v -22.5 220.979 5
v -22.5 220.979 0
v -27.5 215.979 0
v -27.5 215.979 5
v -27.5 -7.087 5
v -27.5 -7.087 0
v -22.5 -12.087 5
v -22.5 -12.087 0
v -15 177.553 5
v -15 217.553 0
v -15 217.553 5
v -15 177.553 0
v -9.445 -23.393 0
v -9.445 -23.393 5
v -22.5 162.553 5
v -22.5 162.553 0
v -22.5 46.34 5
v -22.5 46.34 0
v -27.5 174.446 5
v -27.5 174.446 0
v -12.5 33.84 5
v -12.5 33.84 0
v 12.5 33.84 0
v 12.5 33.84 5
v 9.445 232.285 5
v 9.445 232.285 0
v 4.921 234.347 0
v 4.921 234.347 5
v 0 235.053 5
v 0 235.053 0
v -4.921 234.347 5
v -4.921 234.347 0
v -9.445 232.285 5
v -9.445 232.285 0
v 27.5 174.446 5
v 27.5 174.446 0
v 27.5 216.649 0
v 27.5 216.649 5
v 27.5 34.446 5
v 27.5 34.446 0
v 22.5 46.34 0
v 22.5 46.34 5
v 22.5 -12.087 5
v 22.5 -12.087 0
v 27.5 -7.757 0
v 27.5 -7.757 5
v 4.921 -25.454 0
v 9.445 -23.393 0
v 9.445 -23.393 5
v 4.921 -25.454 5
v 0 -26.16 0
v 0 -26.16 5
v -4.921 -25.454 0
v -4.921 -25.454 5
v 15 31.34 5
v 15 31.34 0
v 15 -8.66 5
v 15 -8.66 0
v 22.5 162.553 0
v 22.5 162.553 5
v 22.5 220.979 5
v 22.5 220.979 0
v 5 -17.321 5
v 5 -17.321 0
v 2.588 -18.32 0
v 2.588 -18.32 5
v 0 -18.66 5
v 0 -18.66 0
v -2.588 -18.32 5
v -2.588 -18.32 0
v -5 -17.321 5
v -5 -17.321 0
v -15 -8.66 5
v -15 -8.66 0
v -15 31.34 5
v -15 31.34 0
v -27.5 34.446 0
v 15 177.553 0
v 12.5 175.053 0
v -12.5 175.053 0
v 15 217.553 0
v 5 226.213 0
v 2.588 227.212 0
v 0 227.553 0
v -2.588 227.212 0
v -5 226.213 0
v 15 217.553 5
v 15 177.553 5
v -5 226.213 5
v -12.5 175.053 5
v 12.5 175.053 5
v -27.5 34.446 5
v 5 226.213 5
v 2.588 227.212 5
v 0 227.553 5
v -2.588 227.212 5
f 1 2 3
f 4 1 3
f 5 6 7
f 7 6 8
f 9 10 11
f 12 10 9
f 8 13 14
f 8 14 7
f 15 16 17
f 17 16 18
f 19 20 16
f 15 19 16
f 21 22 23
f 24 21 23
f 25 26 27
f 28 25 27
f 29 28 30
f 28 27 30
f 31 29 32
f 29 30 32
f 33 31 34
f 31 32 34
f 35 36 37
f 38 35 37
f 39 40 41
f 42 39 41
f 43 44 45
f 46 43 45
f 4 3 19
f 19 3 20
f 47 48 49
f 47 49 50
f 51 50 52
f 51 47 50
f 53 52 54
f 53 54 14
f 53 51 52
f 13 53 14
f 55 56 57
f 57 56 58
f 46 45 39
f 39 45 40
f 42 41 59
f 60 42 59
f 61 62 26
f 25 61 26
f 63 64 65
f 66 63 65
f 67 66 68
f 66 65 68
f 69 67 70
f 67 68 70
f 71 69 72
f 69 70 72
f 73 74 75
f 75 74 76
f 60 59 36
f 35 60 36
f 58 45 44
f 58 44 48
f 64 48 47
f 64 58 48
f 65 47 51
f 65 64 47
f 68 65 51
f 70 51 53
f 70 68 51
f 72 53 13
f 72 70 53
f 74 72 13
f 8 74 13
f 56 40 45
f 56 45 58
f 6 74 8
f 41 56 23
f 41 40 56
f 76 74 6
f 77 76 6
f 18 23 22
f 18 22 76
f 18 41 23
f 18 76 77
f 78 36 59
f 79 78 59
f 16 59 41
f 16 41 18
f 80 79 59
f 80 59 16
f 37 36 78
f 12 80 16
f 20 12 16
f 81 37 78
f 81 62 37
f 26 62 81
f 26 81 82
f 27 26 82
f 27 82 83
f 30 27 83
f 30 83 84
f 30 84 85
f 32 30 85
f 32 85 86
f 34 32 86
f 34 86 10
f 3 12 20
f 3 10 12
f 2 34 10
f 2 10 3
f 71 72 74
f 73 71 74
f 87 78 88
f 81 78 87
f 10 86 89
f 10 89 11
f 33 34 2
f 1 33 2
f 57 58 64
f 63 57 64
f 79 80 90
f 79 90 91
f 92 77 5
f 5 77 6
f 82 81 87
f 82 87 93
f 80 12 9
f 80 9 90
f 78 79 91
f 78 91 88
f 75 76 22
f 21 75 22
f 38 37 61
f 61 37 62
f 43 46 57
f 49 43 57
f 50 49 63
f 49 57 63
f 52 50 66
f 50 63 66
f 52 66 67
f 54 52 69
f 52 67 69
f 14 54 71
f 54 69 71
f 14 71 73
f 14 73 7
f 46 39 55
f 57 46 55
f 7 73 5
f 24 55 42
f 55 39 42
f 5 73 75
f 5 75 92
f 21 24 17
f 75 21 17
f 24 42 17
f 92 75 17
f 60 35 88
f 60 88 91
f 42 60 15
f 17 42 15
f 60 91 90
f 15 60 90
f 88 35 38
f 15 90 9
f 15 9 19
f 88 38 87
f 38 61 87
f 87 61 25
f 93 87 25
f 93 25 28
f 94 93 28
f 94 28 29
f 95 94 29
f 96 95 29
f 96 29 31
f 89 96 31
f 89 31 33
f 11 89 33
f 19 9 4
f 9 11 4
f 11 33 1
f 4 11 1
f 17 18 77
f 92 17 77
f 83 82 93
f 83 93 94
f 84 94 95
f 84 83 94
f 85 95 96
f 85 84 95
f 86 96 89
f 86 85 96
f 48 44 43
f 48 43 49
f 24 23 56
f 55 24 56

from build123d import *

# Parameters (mm, degrees)
BOSS_EXTRUDE1_DEPTH = 5


with BuildPart() as part:
    # Sketch1 → Boss-Extrude1 (new body)
    with BuildSketch(Plane.XY):
        with BuildLine():
            ThreePointArc((9.444973397, -23.392615611), (0, -26.160254038), (-9.444973397, -23.392615611))
            Line((-9.444973397, -23.392615611), (-22.5, -12.086630926))
            Line((-22.5, -12.086630926), (-22.5, 34.44634768))
            Line((-22.5, 34.44634768), (-15.606601718, 41.339745962))
            Line((-15.606601718, 41.339745962), (15.606601718, 41.339745962))
            Line((15.606601718, 41.339745962), (22.5, 34.44634768))
            Line((22.5, 34.44634768), (22.5, -12.086630926))
            Line((22.5, -12.086630926), (9.444973397, -23.392615611))
        make_face()
        with BuildLine():
            Line((15, -8.660254038), (5, -17.320508076))
            ThreePointArc((5, -17.320508076), (0, -18.660254038), (-5, -17.320508076))
            Line((-5, -17.320508076), (-15, -8.660254038))
            Line((-15, -8.660254038), (-15, 31.339745962))
            Line((-15, 31.339745962), (-12.5, 33.839745962))
            Line((-12.5, 33.839745962), (12.5, 33.839745962))
            Line((12.5, 33.839745962), (15, 31.339745962))
            Line((15, 31.339745962), (15, -8.660254038))
        make_face(mode=Mode.SUBTRACT)
        Polygon((22.5, 174.44634768), (15.606601718, 167.552949398), (-15.606601718, 167.552949398), (-22.5, 174.44634768), (-22.5, 34.44634768), (-15.606601718, 41.339745962), (15.606601718, 41.339745962), (22.5, 34.44634768), align=None)
        with BuildLine():
            Line((22.5, 220.979326286), (9.444973397, 232.285310971))
            ThreePointArc((9.444973397, 232.285310971), (0, 235.052949398), (-9.444973397, 232.285310971))
            Line((-9.444973397, 232.285310971), (-22.5, 220.979326286))
            Line((-22.5, 220.979326286), (-22.5, 174.44634768))
            Line((-22.5, 174.44634768), (-15.606601718, 167.552949398))
            Line((-15.606601718, 167.552949398), (15.606601718, 167.552949398))
            Line((15.606601718, 167.552949398), (22.5, 174.44634768))
            Line((22.5, 174.44634768), (22.5, 220.979326286))
        make_face()
        with BuildLine():
            ThreePointArc((5, 226.213203436), (0, 227.552949398), (-5, 226.213203436))
            Line((-5, 226.213203436), (-15, 217.552949398))
            Line((-15, 217.552949398), (-15, 177.552949398))
            Line((-15, 177.552949398), (-12.5, 175.052949398))
            Line((-12.5, 175.052949398), (12.5, 175.052949398))
            Line((12.5, 175.052949398), (15, 177.552949398))
            Line((15, 177.552949398), (15, 217.552949398))
            Line((15, 217.552949398), (5, 226.213203436))
        make_face(mode=Mode.SUBTRACT)
        Polygon((-22.5, -12.086630926), (-22.5, 34.44634768), (-22.5, 46.339745962), (-27.5, 34.44634768), (-27.5, 29.44634768), (-27.5, -7.086630926), align=None)
        Polygon((22.5, -12.086630926), (27.5, -7.756503907), (27.5, 29.44634768), (22.5, 34.44634768), align=None)
        Polygon((22.5, 46.339745962), (22.5, 34.44634768), (27.5, 29.44634768), (27.5, 34.44634768), align=None)
        Polygon((22.5, 174.44634768), (22.5, 162.552949398), (27.5, 174.44634768), (27.5, 179.44634768), (27.5, 216.649199267), (22.5, 220.979326286), align=None)
        Polygon((-27.5, 174.44634768), (-22.5, 162.552949398), (-22.5, 174.44634768), (-22.5, 220.979326286), (-27.5, 215.979326286), (-27.5, 179.44634768), align=None)
    extrude(amount=BOSS_EXTRUDE1_DEPTH)


solid = part.part
